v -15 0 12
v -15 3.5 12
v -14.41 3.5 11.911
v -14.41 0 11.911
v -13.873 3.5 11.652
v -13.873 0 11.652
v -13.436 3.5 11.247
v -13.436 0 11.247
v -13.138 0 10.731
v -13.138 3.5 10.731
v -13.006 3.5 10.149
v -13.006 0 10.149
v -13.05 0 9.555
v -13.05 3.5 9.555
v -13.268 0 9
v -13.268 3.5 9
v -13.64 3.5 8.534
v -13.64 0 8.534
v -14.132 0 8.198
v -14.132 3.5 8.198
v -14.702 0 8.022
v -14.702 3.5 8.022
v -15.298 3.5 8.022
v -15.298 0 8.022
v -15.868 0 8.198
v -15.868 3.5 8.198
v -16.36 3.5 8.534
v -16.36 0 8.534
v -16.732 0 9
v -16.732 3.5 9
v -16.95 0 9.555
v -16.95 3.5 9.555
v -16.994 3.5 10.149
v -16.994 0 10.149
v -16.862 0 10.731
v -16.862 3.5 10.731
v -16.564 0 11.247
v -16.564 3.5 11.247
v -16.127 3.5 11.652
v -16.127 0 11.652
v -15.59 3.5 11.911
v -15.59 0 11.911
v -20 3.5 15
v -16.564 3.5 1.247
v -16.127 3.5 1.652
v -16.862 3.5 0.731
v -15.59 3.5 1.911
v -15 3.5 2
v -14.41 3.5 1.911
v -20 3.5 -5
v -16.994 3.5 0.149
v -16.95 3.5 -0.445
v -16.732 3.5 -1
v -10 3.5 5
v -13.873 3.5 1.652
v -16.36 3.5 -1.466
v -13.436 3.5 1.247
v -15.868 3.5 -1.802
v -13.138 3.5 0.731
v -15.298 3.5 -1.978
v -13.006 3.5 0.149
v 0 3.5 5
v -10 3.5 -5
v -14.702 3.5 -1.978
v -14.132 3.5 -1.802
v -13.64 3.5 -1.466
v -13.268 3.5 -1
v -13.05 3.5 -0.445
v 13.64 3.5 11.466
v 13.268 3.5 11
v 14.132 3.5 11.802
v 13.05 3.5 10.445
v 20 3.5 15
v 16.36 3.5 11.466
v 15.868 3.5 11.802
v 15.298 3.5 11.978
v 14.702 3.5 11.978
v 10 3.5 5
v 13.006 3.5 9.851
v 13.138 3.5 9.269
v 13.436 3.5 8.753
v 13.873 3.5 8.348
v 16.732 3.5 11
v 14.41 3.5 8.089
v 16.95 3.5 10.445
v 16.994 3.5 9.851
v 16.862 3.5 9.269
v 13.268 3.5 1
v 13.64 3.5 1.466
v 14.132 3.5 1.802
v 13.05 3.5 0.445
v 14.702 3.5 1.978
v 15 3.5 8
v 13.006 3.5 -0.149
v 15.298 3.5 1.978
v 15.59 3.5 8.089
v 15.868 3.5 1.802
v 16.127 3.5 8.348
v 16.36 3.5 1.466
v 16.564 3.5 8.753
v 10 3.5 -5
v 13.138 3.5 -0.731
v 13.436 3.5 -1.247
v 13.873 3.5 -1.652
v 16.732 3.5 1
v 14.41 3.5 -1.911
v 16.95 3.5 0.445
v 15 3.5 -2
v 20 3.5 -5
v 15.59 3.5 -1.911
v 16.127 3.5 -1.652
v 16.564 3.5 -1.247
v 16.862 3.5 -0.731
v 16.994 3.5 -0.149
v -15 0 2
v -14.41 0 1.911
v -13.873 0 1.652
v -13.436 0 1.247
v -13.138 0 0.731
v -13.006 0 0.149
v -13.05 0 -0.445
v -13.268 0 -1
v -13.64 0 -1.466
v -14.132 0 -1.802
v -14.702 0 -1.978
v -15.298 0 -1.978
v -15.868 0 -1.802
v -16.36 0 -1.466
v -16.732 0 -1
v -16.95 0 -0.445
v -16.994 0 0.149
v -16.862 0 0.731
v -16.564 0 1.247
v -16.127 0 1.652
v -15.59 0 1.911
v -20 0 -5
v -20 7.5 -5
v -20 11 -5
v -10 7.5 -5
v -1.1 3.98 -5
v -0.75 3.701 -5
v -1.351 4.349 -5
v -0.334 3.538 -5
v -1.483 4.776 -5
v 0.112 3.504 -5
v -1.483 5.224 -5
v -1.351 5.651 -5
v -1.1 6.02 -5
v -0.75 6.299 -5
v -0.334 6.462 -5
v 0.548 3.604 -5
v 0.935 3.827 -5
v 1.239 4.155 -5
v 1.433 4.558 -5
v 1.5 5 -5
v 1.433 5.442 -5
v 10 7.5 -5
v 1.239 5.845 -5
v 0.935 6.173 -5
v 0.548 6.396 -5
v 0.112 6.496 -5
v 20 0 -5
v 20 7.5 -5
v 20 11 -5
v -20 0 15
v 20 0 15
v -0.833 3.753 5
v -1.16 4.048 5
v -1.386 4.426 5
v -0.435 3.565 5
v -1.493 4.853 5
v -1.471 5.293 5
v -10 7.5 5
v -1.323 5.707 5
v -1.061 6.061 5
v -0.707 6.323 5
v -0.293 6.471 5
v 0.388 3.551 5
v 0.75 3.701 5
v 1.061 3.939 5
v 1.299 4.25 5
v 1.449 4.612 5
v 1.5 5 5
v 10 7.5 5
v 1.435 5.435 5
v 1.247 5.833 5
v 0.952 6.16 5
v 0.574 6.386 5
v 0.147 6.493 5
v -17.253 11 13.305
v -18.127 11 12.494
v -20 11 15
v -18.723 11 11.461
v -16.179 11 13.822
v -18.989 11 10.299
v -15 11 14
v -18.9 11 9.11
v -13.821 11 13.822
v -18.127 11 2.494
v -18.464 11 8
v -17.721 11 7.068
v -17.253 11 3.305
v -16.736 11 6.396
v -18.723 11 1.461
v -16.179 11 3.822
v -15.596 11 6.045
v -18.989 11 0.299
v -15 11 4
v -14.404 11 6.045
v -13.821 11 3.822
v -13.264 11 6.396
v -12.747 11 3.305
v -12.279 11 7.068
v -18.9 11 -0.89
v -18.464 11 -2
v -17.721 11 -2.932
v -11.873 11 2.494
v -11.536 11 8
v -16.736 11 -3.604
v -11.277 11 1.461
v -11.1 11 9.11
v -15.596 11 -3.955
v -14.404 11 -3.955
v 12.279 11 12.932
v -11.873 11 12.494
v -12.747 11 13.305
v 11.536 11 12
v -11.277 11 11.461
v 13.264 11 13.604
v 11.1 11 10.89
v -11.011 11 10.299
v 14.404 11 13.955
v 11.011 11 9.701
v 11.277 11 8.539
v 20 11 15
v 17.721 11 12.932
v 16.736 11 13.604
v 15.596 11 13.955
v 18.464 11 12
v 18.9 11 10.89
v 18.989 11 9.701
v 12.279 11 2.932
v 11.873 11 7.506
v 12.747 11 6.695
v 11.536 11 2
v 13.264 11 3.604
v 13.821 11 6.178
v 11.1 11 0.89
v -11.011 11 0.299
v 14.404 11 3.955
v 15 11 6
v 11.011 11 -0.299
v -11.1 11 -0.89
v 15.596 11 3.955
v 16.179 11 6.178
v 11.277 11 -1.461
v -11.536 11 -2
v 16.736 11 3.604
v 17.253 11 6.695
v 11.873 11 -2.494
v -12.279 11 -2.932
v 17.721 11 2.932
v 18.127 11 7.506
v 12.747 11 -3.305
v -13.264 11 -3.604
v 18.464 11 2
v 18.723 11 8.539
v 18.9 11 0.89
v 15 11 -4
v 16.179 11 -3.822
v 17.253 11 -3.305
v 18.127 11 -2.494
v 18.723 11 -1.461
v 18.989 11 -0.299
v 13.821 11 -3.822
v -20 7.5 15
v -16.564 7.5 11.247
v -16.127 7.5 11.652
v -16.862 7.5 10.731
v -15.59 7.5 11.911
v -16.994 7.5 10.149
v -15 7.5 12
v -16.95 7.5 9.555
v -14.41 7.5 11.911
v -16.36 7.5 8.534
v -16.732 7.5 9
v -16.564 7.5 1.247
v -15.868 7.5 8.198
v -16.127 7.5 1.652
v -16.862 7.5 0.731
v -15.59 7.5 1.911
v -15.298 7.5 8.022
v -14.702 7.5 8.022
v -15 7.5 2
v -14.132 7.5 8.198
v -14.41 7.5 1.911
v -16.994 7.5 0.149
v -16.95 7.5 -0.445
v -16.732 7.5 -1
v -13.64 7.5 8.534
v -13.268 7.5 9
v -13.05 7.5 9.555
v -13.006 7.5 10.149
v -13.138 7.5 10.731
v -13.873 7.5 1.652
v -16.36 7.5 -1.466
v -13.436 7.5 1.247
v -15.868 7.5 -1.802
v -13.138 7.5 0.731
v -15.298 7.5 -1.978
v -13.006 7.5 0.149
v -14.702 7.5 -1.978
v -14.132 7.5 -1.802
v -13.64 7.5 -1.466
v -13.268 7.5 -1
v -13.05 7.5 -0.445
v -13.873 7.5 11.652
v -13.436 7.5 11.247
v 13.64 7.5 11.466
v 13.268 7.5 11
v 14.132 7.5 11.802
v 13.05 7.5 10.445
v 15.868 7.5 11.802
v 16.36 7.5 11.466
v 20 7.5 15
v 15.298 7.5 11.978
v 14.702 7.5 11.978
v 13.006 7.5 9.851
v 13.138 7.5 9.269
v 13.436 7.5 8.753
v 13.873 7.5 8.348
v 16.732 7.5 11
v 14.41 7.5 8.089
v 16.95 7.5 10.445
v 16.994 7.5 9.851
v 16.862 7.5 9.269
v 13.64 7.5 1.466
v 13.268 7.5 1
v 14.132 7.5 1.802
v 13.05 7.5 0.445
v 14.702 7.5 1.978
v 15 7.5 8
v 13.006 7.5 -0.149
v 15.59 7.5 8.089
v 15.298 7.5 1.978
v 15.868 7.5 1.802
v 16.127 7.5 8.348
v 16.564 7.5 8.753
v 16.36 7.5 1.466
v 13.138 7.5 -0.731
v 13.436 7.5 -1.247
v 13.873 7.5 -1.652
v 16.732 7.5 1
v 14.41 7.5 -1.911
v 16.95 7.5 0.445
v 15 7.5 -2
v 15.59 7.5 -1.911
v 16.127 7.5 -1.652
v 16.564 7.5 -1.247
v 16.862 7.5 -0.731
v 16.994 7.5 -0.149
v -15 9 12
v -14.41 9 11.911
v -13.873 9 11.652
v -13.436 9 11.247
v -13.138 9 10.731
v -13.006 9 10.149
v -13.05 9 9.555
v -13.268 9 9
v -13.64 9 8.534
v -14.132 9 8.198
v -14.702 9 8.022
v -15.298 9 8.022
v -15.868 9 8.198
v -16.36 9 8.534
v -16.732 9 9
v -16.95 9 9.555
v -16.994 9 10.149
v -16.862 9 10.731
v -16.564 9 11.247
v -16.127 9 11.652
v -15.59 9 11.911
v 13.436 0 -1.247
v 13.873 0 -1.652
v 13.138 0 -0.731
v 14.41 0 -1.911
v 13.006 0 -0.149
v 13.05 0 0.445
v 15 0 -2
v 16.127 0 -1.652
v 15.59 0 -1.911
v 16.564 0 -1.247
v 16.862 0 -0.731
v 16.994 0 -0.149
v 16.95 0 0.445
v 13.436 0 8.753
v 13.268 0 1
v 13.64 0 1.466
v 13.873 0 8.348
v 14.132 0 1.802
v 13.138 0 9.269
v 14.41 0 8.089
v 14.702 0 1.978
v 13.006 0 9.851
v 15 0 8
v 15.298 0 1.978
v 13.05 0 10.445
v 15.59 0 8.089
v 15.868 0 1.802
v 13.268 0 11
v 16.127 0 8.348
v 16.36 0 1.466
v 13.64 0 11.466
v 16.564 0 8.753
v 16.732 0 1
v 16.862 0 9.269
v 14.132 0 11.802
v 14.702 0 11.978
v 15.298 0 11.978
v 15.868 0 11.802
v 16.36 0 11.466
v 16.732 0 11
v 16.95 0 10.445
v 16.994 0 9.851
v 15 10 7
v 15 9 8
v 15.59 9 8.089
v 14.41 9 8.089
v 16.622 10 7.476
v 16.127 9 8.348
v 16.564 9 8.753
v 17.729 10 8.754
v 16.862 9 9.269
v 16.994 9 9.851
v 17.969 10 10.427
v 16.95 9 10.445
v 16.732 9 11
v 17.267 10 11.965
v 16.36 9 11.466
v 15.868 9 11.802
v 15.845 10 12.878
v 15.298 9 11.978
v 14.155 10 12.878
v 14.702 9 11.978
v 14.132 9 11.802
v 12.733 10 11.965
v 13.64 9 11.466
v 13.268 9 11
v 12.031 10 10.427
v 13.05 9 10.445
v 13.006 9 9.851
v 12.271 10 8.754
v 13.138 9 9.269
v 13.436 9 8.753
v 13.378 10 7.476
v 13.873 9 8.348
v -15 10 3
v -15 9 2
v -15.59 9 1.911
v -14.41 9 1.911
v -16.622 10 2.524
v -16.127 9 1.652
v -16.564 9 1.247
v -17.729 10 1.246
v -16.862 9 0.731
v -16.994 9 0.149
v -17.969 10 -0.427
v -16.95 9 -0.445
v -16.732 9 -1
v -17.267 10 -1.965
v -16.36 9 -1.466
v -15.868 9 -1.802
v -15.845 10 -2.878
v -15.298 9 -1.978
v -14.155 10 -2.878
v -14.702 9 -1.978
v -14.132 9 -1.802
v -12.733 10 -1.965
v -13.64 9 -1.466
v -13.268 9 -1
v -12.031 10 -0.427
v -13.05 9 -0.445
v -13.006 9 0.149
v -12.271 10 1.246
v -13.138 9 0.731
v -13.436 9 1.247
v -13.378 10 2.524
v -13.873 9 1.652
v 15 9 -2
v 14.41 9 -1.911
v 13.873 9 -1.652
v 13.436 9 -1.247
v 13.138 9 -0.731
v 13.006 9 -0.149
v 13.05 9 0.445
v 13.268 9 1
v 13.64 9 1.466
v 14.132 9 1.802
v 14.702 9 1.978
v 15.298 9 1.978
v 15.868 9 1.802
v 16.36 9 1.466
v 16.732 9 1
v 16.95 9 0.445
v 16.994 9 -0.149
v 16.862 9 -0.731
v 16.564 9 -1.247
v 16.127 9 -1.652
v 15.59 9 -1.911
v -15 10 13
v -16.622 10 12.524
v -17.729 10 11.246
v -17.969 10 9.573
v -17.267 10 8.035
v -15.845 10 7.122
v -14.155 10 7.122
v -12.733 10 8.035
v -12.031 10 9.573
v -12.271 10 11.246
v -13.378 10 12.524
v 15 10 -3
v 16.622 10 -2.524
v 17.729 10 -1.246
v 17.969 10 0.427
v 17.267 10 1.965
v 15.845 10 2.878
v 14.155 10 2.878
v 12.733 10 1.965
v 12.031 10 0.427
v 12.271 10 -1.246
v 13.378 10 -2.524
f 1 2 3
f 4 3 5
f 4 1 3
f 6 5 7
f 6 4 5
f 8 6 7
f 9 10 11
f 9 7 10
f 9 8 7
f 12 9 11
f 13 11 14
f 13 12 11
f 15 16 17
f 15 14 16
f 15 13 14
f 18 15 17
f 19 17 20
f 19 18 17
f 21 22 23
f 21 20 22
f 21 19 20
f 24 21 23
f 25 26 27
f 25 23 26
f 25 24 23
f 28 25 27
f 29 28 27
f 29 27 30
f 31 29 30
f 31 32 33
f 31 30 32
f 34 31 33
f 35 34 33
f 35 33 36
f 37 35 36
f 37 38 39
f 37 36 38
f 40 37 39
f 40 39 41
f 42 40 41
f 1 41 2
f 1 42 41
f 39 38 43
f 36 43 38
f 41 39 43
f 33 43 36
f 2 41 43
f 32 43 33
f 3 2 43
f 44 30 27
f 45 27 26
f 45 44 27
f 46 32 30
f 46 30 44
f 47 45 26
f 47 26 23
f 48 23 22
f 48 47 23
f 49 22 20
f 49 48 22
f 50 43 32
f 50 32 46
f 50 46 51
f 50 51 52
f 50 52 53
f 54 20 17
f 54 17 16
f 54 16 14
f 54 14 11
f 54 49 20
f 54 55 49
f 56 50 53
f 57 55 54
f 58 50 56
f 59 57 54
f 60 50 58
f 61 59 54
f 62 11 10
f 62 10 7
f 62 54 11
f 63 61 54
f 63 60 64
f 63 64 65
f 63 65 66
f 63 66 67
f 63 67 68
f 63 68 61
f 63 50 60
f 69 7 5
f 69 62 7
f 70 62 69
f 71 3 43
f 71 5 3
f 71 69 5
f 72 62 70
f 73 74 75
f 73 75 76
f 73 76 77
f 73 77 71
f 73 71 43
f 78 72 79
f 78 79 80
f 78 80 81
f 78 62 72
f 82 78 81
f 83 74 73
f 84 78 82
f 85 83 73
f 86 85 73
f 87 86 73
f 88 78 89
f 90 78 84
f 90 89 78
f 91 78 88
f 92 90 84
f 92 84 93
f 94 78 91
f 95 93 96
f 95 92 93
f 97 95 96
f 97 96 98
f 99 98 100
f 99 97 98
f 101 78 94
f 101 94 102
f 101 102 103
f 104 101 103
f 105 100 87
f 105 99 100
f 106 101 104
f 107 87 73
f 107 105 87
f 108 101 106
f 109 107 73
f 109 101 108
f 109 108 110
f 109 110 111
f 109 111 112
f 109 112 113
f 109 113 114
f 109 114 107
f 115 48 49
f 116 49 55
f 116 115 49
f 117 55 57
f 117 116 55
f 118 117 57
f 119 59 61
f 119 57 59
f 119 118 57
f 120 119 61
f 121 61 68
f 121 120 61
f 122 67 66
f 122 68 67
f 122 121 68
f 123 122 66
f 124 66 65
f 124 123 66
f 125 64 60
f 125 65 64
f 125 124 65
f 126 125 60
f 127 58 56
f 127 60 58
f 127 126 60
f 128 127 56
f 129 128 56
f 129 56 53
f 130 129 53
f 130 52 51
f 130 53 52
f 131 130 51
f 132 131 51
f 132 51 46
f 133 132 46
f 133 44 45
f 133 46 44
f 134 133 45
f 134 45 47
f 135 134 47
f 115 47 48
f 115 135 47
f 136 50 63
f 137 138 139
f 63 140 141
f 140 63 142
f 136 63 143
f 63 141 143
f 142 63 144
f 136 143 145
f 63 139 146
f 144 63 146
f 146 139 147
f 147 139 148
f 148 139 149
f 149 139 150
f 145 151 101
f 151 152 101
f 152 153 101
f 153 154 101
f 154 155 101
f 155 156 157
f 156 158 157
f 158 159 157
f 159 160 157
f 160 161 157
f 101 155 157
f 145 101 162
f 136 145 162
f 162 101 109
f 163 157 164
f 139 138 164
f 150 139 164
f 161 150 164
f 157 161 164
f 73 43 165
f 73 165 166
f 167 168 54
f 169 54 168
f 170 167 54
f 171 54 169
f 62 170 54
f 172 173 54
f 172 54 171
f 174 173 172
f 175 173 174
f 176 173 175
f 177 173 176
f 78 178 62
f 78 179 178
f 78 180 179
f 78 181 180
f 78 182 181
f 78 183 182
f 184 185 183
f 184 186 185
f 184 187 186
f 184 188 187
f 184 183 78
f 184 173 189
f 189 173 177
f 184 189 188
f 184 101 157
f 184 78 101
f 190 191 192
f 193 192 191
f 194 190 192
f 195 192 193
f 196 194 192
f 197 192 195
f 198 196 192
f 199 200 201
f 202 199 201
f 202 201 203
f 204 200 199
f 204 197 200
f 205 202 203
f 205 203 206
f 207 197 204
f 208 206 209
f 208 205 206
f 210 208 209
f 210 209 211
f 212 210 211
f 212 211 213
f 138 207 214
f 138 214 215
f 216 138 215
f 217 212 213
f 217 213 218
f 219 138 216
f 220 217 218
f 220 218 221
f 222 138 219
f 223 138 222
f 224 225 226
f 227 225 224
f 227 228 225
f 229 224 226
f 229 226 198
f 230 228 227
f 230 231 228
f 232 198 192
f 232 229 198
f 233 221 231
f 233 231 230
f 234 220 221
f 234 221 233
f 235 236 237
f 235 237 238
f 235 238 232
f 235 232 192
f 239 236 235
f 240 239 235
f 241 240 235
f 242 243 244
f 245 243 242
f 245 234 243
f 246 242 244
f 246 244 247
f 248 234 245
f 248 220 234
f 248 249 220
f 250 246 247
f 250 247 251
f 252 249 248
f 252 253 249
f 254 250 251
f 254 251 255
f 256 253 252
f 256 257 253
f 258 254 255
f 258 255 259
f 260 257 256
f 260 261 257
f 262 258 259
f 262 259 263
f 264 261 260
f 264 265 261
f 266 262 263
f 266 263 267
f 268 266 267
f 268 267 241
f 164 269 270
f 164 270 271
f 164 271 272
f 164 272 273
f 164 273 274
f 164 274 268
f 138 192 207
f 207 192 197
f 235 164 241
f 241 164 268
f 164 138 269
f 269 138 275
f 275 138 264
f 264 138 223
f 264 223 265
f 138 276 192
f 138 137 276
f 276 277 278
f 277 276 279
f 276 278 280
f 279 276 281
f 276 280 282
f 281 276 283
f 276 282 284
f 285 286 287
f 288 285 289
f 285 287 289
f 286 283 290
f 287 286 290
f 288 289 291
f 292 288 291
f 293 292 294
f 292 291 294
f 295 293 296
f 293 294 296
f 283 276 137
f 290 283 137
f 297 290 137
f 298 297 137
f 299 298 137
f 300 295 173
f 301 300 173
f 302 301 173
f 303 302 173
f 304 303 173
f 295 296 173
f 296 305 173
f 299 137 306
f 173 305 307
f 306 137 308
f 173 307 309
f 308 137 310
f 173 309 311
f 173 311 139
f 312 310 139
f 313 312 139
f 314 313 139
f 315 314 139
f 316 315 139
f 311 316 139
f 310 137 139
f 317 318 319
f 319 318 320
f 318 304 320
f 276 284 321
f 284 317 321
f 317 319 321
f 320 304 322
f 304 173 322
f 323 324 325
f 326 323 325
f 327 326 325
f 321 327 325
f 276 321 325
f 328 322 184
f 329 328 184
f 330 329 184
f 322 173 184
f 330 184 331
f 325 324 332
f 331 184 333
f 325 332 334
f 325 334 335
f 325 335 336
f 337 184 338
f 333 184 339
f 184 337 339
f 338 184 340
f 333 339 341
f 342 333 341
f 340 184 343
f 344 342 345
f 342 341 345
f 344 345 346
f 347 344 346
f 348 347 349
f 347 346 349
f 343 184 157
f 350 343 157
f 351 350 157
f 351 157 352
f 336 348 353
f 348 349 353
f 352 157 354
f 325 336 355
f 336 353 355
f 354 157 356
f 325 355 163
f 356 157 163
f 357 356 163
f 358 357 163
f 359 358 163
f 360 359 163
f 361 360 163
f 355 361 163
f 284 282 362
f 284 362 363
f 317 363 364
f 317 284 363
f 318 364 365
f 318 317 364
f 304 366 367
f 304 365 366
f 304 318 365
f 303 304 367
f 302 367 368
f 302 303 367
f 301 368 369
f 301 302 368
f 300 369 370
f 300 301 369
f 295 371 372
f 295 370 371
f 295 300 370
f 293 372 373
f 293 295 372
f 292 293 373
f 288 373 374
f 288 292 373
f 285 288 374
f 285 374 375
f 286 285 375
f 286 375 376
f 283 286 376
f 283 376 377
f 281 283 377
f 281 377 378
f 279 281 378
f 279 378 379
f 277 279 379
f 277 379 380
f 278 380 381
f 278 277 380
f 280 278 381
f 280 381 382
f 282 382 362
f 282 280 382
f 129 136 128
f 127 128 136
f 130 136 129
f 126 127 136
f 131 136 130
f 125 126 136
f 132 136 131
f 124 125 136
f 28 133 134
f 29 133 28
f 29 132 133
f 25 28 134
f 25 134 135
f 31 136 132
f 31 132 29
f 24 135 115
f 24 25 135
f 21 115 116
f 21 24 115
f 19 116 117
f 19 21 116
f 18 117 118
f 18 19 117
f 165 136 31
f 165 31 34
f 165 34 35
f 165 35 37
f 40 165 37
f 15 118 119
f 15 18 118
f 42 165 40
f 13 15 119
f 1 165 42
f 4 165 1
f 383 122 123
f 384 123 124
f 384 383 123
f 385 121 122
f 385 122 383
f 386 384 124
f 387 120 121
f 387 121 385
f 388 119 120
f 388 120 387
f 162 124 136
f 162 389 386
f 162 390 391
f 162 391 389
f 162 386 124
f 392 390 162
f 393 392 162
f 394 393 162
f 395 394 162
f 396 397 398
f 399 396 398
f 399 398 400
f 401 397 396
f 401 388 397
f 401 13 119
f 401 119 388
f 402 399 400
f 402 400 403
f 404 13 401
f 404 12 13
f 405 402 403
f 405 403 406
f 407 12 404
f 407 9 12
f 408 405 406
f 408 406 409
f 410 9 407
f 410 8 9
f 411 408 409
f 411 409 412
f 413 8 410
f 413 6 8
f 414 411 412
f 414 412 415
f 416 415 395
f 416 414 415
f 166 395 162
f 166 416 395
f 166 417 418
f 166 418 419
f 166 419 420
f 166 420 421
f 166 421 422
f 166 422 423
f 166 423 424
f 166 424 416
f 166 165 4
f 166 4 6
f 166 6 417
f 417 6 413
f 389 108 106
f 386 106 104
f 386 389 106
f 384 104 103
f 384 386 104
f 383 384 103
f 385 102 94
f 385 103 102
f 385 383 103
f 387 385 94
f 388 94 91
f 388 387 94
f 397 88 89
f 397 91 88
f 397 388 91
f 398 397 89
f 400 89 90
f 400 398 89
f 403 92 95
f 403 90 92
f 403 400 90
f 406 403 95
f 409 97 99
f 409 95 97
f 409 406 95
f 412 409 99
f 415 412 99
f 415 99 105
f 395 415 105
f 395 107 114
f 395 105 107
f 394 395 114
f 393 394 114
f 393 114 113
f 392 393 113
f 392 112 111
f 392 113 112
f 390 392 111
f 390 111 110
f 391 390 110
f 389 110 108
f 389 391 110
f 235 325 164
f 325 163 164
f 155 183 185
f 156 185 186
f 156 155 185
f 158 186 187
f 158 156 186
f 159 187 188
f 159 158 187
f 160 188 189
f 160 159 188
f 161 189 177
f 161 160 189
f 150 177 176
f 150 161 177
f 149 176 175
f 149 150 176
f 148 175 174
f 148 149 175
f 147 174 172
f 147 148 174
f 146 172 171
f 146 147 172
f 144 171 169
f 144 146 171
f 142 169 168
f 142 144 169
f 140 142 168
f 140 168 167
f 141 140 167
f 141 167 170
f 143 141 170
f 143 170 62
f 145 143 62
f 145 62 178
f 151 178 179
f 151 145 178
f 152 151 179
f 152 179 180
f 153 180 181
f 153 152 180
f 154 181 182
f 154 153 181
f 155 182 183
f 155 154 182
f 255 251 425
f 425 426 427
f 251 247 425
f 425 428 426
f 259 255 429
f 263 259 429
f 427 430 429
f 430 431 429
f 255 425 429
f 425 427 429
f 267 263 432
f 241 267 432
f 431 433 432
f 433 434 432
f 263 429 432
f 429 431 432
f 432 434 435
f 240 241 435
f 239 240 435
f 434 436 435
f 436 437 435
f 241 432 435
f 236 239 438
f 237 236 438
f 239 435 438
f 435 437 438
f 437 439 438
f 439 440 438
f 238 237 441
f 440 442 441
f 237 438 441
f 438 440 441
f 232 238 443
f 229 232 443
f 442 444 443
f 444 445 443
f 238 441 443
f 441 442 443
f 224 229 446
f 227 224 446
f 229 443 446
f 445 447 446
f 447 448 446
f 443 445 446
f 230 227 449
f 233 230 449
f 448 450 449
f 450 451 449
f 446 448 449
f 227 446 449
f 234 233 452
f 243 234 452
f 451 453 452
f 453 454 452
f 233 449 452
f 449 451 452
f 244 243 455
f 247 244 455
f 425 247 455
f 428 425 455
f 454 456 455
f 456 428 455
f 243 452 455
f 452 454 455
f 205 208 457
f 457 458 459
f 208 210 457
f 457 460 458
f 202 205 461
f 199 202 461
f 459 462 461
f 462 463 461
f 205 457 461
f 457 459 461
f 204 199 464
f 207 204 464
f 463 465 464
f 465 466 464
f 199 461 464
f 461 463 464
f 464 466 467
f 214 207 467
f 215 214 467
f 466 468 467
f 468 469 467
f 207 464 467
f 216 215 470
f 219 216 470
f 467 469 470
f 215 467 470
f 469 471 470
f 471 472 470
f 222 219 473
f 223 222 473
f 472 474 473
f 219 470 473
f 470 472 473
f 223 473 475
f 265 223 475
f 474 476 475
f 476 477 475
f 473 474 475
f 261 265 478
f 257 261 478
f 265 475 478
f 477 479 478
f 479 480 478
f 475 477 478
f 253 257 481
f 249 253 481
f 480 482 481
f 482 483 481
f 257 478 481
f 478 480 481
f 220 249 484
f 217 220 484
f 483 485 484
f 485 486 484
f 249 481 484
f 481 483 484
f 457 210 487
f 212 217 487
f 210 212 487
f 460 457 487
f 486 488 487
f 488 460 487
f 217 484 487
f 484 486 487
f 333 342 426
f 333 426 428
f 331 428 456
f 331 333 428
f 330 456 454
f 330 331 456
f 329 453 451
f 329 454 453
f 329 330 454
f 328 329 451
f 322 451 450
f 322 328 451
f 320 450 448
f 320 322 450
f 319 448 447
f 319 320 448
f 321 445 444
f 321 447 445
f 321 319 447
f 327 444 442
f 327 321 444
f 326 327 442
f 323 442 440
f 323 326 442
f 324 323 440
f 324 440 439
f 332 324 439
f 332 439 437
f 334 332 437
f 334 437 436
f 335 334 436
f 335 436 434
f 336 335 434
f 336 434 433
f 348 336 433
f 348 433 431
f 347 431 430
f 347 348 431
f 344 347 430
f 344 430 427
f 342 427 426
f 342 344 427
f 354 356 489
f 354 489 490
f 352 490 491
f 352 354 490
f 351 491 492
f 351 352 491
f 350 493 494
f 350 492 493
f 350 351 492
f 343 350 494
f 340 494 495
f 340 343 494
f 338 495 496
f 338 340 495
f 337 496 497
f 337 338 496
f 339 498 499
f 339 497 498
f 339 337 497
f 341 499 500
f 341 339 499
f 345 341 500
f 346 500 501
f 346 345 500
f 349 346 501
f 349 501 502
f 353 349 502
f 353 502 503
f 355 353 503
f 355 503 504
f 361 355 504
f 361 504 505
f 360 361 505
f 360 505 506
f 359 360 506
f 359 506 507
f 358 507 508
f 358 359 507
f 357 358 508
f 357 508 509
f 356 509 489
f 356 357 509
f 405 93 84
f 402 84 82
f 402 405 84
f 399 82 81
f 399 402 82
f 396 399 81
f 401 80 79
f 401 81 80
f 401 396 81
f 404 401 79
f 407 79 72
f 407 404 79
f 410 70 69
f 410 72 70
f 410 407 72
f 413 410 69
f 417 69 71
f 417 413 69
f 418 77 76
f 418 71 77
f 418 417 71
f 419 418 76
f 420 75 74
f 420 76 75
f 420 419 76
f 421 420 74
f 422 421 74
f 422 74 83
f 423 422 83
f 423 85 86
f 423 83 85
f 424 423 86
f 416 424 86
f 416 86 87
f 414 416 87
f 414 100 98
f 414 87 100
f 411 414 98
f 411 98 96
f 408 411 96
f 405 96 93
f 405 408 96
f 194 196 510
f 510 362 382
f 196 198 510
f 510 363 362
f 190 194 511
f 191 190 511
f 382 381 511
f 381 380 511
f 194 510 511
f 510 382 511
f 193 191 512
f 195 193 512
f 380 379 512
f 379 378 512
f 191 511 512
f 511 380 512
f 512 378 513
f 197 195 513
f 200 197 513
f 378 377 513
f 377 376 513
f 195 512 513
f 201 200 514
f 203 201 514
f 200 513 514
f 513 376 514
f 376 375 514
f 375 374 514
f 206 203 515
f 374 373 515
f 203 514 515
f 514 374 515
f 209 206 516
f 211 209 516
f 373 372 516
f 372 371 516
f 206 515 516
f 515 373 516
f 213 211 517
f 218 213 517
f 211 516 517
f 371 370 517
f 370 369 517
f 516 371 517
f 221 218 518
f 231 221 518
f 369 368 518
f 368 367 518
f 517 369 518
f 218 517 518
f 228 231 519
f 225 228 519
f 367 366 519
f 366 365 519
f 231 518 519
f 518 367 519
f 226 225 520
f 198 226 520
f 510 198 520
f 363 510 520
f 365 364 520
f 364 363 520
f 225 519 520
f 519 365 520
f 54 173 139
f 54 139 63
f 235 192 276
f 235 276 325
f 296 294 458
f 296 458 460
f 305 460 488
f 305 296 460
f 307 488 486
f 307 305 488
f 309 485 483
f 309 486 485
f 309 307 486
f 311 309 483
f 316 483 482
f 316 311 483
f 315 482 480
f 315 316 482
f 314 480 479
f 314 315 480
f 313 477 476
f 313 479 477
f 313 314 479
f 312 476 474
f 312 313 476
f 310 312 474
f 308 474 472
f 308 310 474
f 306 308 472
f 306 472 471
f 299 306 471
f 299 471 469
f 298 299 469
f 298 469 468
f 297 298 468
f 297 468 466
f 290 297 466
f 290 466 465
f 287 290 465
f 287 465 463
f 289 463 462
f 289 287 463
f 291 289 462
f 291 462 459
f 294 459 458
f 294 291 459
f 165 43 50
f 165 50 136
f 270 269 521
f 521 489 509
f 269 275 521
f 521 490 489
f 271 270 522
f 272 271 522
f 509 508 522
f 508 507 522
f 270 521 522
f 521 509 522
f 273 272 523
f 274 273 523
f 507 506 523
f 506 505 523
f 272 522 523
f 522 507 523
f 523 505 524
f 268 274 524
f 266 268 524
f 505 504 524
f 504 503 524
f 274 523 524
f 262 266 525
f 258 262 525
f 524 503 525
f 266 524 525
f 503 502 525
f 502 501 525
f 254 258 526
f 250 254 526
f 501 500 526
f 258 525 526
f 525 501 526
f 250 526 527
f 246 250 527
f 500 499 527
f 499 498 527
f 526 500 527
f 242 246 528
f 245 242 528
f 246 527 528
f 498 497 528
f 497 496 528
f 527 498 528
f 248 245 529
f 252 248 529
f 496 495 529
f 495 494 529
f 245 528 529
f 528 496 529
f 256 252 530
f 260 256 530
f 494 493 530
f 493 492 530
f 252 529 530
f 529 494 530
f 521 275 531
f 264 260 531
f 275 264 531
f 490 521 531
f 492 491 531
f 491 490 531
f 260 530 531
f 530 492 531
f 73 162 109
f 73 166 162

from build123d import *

# Parameters (mm, degrees)
SKETCH_1_R          = 1.5
EXTRUDE_1_DEPTH     = 5
SKETCH_3_W          = 40
SKETCH_3_H          = 3.5
EXTRUDE_2_DEPTH     = 10
SKETCH_2_R          = 2
CUT_EXTRUDE_1_DEPTH = 28.313000567
CHAMFER_1_SIZE      = 2


with BuildPart() as part:
    # 草图1 → 凸台-拉伸1 (new, symmetric)
    with BuildSketch(Plane.XY):
        Polygon((20, 11), (-20, 11), (-20, 7.5), (-10, 7.5), (-10, 3.5), (-20, 3.5), (-20, 0), (0, 0), (20, 0), (20, 3.5), (10, 3.5), (10, 7.5), (20, 7.5), align=None)
        with Locations((0, 5)):
            Circle(SKETCH_1_R, mode=Mode.SUBTRACT)
    extrude(amount=EXTRUDE_1_DEPTH, both=True)

    # 草图3 → 凸台-拉伸2 (add)
    with BuildSketch(Plane.XY.offset(5)):
        with Locations((0, 9.25)):
            Rectangle(SKETCH_3_W, SKETCH_3_H)
        with Locations((0, 1.75)):
            Rectangle(SKETCH_3_W, SKETCH_3_H)
    extrude(amount=EXTRUDE_2_DEPTH)

    # 草图2 → 切除-拉伸1 (cut, through all)
    with BuildSketch(Plane(origin=(0, 0, 0), x_dir=(1, 0, 0), z_dir=(0, 1, 0))):
        with Locations(Location((-15, 0, 0), (0, 0, 270))):
            Circle(SKETCH_2_R)
        with Locations(Location((15, 0, 0), (0, 0, 90))):
            Circle(SKETCH_2_R)
        with Locations(Location((-15, -10, 0), (0, 0, 270))):
            Circle(SKETCH_2_R)
        with Locations(Location((15, -10, 0), (0, 0, 90))):
            Circle(SKETCH_2_R)
    extrude(amount=CUT_EXTRUDE_1_DEPTH, mode=Mode.SUBTRACT)

    # 倒角1
    chamfer_1_edges = [part.edges().sort_by_distance(p)[0] for p in [
        (15, 11, 2),
        (-15, 11, 8),
        (15, 11, 12),
        (-15, 11, -2),
    ]]
    chamfer(chamfer_1_edges, length=CHAMFER_1_SIZE)


solid = part.part
